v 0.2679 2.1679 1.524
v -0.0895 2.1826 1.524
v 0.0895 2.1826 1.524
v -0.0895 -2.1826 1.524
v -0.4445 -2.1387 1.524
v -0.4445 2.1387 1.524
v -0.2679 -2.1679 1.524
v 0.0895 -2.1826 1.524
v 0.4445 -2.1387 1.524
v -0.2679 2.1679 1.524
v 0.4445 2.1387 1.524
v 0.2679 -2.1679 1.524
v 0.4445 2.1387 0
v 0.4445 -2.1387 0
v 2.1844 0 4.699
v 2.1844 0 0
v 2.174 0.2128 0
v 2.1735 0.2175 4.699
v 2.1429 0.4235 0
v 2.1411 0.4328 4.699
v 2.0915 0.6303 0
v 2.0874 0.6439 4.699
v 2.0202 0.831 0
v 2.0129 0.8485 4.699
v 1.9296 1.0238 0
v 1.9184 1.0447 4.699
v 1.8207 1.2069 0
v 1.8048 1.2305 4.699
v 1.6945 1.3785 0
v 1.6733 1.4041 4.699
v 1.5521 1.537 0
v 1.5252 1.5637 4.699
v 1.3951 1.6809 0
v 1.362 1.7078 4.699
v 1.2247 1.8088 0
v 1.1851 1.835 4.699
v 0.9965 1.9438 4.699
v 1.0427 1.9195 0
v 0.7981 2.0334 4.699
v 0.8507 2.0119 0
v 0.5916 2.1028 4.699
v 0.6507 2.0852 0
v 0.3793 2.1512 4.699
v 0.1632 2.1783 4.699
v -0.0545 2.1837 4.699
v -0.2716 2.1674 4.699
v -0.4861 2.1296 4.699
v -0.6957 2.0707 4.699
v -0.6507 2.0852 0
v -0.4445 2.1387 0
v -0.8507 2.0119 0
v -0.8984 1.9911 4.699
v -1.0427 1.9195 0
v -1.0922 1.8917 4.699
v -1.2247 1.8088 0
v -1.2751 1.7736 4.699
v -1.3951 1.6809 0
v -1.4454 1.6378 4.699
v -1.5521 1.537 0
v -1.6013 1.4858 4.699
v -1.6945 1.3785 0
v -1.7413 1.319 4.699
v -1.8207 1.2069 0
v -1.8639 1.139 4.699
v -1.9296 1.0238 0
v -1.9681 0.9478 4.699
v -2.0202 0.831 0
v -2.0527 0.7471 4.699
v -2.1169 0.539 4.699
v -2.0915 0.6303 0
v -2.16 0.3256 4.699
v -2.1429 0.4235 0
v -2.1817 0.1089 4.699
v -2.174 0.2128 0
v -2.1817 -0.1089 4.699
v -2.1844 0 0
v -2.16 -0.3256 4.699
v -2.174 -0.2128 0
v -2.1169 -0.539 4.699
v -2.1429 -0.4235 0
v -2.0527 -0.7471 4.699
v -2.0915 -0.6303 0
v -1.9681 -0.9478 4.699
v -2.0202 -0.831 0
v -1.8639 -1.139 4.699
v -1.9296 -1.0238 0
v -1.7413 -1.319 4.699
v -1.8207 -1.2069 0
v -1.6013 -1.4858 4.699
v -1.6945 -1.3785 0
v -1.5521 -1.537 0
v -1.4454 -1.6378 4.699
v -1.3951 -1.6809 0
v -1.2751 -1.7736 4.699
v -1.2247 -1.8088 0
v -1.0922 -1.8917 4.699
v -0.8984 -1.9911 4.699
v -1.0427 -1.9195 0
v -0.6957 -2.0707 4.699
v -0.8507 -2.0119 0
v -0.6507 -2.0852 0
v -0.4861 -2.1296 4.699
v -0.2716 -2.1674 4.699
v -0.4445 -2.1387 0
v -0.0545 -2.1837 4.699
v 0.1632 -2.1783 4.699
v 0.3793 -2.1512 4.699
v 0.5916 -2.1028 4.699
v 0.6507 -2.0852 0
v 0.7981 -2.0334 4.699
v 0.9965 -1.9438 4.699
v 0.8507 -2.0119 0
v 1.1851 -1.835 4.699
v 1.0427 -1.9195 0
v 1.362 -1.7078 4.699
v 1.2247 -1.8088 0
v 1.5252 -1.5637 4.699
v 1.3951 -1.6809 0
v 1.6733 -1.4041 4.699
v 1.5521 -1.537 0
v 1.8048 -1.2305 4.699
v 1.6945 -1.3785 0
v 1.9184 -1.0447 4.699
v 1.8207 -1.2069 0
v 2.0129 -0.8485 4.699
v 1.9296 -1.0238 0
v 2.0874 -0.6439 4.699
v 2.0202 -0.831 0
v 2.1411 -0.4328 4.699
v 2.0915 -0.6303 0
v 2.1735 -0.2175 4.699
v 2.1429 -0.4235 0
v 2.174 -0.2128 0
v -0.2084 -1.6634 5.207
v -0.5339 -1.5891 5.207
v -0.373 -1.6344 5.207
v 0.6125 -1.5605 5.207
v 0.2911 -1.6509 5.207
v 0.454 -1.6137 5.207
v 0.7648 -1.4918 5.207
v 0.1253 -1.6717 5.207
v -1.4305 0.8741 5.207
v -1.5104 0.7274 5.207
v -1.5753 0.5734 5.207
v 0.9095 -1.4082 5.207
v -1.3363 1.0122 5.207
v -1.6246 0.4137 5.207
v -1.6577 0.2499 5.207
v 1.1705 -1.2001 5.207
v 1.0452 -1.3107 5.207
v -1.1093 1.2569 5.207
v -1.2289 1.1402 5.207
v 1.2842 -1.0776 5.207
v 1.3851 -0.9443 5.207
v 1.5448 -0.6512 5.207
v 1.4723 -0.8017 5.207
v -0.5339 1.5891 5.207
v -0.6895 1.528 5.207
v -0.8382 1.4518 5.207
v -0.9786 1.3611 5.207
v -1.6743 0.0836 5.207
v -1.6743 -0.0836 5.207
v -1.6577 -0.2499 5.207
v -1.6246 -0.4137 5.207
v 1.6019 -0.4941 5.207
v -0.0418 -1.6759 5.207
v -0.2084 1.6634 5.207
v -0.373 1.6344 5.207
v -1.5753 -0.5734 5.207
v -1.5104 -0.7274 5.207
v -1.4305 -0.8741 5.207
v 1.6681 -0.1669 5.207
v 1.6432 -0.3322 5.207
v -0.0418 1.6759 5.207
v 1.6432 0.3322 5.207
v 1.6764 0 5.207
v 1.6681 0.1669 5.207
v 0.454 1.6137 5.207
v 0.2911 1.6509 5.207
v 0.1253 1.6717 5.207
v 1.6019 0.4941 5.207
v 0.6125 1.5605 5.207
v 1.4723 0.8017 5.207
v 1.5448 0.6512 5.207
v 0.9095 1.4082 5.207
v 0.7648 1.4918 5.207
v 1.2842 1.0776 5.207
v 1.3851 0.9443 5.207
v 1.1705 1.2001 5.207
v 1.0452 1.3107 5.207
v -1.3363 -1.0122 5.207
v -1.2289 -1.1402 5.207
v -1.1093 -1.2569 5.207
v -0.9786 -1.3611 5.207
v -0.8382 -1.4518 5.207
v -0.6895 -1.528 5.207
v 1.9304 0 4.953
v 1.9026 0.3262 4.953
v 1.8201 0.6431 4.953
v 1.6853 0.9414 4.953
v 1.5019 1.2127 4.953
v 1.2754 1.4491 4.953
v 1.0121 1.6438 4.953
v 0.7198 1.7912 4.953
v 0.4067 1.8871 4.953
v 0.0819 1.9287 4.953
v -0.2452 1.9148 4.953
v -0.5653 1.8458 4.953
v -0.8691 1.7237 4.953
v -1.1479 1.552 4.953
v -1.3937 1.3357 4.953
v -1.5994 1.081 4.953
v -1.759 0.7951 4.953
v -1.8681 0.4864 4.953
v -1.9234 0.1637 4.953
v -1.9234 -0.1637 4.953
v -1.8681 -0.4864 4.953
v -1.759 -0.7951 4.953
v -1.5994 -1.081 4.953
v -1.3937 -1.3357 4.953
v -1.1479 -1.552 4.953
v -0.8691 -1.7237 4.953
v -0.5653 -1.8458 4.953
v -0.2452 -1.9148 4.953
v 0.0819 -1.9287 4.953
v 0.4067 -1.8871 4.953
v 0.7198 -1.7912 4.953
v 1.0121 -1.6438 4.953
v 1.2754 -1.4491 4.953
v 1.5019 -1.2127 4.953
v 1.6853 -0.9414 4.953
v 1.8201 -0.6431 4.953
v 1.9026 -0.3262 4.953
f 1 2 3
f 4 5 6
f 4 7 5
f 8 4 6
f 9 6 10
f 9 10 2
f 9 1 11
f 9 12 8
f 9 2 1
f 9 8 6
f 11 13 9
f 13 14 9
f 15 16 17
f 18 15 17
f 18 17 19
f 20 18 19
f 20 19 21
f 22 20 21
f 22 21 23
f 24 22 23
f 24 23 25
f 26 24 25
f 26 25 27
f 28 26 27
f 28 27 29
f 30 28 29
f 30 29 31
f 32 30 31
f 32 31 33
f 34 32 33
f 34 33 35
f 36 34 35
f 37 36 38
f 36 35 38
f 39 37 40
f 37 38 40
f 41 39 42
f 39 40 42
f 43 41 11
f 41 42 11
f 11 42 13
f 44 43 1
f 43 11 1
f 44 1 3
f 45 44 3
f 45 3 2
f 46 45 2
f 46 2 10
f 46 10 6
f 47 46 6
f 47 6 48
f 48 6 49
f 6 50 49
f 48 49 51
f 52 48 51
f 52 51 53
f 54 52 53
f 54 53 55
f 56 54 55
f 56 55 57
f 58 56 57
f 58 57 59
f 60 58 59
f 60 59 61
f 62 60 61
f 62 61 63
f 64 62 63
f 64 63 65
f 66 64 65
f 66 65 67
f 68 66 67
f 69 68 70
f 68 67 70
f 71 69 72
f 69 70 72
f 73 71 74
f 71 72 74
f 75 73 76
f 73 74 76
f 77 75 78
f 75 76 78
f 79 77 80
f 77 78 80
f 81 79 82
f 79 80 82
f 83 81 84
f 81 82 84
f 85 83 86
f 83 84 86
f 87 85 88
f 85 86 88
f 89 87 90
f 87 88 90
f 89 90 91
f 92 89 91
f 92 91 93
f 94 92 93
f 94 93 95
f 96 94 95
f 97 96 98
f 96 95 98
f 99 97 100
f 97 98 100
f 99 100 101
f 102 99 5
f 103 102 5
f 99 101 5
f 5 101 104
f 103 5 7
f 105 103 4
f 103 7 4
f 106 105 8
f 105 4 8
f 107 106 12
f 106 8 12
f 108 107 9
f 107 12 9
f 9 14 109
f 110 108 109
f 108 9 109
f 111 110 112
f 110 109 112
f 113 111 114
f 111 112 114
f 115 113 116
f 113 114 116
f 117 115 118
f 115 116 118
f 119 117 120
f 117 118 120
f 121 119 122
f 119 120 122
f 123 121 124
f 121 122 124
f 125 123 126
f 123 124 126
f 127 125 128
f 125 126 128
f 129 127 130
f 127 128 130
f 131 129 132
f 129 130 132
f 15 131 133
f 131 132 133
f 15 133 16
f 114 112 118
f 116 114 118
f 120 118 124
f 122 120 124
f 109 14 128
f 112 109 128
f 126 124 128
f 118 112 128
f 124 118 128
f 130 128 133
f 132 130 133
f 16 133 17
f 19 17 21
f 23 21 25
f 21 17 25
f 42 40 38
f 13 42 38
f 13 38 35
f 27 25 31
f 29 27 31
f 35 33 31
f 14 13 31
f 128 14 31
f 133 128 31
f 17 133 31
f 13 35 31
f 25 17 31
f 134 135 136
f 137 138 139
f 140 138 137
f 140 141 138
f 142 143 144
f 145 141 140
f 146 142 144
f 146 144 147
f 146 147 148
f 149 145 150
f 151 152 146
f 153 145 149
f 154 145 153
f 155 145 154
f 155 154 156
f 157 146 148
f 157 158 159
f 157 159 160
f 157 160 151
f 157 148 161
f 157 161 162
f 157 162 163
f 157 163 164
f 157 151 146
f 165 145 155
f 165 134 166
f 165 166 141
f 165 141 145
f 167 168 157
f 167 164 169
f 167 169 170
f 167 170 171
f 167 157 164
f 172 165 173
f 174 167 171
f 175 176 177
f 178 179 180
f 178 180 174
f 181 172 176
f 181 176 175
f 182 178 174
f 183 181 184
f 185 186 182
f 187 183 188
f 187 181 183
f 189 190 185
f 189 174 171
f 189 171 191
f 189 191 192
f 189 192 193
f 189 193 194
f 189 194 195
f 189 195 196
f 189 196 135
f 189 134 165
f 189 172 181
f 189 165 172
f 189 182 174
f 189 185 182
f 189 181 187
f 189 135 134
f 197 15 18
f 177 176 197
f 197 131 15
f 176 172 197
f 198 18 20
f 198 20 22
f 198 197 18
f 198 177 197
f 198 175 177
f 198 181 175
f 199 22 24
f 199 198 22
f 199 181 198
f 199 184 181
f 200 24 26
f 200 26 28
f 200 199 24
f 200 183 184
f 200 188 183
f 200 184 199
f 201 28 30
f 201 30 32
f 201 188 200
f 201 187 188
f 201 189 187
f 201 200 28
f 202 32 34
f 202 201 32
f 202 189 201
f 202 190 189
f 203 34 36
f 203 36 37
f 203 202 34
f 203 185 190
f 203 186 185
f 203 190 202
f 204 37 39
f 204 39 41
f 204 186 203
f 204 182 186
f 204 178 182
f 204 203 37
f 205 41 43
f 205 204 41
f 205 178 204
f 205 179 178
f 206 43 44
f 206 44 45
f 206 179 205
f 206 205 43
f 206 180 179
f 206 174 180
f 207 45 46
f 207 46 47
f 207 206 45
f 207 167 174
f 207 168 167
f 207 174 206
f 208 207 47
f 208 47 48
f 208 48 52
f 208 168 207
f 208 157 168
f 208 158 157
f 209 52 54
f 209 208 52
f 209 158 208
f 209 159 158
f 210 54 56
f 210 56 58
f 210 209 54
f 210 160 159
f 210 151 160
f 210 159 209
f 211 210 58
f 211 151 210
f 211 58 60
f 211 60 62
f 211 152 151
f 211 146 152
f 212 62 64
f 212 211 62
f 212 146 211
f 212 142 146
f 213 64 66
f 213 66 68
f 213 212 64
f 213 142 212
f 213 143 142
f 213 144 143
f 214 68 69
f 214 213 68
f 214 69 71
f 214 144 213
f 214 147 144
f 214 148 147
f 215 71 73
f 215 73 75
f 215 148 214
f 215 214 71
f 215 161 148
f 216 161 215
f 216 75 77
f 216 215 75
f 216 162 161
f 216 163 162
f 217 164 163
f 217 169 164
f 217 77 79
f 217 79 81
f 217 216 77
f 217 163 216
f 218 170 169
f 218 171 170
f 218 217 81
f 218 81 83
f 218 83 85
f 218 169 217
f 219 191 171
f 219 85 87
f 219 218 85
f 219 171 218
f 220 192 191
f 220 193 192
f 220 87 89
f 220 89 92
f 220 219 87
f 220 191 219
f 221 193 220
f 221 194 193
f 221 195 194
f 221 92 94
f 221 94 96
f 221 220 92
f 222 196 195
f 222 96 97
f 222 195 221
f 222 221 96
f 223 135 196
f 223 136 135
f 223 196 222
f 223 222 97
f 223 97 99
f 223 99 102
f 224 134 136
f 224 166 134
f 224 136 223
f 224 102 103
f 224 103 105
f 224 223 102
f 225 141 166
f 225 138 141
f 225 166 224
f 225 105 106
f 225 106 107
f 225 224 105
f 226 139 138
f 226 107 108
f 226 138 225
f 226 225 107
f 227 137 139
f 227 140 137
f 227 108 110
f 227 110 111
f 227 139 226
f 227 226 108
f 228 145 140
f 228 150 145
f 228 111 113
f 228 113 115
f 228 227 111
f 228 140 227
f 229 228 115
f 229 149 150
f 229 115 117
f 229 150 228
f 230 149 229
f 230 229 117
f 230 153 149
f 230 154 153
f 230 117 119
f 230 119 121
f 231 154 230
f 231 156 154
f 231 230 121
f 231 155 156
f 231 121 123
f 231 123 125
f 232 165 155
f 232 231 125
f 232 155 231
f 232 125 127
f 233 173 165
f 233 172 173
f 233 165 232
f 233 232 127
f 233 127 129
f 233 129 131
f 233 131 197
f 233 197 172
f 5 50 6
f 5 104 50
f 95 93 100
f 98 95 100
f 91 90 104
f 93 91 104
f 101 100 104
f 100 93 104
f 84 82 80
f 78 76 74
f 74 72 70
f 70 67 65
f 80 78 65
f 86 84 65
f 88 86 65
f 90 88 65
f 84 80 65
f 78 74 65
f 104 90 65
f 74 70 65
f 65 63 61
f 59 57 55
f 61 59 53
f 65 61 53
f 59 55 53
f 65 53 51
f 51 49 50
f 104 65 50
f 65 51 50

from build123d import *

# Parameters (mm, degrees)
F0_R     = 2.1844
F1_DEPTH = 5.207
F2_W     = 0.889
F2_H     = 3.048
F3_DEPTH = 12.7
F4_SIZE  = 0.508


with BuildPart() as f1:
    # F0 (on Top) → F1 (new body)
    with BuildSketch(Plane.XY):
        Circle(F0_R)
    extrude(amount=F1_DEPTH)

    # F2 (on Front) → F3 (cut, symmetric)
    with BuildSketch(Plane.XZ):
        Rectangle(F2_W, F2_H)
    extrude(amount=F3_DEPTH, both=True, mode=Mode.SUBTRACT)

    # F4
    f4_edges = [f1.edges().sort_by_distance(p)[0] for p in [
        (-2.1844, 0, 5.207),
    ]]
    chamfer(f4_edges, length=F4_SIZE)


solid = f1.part
